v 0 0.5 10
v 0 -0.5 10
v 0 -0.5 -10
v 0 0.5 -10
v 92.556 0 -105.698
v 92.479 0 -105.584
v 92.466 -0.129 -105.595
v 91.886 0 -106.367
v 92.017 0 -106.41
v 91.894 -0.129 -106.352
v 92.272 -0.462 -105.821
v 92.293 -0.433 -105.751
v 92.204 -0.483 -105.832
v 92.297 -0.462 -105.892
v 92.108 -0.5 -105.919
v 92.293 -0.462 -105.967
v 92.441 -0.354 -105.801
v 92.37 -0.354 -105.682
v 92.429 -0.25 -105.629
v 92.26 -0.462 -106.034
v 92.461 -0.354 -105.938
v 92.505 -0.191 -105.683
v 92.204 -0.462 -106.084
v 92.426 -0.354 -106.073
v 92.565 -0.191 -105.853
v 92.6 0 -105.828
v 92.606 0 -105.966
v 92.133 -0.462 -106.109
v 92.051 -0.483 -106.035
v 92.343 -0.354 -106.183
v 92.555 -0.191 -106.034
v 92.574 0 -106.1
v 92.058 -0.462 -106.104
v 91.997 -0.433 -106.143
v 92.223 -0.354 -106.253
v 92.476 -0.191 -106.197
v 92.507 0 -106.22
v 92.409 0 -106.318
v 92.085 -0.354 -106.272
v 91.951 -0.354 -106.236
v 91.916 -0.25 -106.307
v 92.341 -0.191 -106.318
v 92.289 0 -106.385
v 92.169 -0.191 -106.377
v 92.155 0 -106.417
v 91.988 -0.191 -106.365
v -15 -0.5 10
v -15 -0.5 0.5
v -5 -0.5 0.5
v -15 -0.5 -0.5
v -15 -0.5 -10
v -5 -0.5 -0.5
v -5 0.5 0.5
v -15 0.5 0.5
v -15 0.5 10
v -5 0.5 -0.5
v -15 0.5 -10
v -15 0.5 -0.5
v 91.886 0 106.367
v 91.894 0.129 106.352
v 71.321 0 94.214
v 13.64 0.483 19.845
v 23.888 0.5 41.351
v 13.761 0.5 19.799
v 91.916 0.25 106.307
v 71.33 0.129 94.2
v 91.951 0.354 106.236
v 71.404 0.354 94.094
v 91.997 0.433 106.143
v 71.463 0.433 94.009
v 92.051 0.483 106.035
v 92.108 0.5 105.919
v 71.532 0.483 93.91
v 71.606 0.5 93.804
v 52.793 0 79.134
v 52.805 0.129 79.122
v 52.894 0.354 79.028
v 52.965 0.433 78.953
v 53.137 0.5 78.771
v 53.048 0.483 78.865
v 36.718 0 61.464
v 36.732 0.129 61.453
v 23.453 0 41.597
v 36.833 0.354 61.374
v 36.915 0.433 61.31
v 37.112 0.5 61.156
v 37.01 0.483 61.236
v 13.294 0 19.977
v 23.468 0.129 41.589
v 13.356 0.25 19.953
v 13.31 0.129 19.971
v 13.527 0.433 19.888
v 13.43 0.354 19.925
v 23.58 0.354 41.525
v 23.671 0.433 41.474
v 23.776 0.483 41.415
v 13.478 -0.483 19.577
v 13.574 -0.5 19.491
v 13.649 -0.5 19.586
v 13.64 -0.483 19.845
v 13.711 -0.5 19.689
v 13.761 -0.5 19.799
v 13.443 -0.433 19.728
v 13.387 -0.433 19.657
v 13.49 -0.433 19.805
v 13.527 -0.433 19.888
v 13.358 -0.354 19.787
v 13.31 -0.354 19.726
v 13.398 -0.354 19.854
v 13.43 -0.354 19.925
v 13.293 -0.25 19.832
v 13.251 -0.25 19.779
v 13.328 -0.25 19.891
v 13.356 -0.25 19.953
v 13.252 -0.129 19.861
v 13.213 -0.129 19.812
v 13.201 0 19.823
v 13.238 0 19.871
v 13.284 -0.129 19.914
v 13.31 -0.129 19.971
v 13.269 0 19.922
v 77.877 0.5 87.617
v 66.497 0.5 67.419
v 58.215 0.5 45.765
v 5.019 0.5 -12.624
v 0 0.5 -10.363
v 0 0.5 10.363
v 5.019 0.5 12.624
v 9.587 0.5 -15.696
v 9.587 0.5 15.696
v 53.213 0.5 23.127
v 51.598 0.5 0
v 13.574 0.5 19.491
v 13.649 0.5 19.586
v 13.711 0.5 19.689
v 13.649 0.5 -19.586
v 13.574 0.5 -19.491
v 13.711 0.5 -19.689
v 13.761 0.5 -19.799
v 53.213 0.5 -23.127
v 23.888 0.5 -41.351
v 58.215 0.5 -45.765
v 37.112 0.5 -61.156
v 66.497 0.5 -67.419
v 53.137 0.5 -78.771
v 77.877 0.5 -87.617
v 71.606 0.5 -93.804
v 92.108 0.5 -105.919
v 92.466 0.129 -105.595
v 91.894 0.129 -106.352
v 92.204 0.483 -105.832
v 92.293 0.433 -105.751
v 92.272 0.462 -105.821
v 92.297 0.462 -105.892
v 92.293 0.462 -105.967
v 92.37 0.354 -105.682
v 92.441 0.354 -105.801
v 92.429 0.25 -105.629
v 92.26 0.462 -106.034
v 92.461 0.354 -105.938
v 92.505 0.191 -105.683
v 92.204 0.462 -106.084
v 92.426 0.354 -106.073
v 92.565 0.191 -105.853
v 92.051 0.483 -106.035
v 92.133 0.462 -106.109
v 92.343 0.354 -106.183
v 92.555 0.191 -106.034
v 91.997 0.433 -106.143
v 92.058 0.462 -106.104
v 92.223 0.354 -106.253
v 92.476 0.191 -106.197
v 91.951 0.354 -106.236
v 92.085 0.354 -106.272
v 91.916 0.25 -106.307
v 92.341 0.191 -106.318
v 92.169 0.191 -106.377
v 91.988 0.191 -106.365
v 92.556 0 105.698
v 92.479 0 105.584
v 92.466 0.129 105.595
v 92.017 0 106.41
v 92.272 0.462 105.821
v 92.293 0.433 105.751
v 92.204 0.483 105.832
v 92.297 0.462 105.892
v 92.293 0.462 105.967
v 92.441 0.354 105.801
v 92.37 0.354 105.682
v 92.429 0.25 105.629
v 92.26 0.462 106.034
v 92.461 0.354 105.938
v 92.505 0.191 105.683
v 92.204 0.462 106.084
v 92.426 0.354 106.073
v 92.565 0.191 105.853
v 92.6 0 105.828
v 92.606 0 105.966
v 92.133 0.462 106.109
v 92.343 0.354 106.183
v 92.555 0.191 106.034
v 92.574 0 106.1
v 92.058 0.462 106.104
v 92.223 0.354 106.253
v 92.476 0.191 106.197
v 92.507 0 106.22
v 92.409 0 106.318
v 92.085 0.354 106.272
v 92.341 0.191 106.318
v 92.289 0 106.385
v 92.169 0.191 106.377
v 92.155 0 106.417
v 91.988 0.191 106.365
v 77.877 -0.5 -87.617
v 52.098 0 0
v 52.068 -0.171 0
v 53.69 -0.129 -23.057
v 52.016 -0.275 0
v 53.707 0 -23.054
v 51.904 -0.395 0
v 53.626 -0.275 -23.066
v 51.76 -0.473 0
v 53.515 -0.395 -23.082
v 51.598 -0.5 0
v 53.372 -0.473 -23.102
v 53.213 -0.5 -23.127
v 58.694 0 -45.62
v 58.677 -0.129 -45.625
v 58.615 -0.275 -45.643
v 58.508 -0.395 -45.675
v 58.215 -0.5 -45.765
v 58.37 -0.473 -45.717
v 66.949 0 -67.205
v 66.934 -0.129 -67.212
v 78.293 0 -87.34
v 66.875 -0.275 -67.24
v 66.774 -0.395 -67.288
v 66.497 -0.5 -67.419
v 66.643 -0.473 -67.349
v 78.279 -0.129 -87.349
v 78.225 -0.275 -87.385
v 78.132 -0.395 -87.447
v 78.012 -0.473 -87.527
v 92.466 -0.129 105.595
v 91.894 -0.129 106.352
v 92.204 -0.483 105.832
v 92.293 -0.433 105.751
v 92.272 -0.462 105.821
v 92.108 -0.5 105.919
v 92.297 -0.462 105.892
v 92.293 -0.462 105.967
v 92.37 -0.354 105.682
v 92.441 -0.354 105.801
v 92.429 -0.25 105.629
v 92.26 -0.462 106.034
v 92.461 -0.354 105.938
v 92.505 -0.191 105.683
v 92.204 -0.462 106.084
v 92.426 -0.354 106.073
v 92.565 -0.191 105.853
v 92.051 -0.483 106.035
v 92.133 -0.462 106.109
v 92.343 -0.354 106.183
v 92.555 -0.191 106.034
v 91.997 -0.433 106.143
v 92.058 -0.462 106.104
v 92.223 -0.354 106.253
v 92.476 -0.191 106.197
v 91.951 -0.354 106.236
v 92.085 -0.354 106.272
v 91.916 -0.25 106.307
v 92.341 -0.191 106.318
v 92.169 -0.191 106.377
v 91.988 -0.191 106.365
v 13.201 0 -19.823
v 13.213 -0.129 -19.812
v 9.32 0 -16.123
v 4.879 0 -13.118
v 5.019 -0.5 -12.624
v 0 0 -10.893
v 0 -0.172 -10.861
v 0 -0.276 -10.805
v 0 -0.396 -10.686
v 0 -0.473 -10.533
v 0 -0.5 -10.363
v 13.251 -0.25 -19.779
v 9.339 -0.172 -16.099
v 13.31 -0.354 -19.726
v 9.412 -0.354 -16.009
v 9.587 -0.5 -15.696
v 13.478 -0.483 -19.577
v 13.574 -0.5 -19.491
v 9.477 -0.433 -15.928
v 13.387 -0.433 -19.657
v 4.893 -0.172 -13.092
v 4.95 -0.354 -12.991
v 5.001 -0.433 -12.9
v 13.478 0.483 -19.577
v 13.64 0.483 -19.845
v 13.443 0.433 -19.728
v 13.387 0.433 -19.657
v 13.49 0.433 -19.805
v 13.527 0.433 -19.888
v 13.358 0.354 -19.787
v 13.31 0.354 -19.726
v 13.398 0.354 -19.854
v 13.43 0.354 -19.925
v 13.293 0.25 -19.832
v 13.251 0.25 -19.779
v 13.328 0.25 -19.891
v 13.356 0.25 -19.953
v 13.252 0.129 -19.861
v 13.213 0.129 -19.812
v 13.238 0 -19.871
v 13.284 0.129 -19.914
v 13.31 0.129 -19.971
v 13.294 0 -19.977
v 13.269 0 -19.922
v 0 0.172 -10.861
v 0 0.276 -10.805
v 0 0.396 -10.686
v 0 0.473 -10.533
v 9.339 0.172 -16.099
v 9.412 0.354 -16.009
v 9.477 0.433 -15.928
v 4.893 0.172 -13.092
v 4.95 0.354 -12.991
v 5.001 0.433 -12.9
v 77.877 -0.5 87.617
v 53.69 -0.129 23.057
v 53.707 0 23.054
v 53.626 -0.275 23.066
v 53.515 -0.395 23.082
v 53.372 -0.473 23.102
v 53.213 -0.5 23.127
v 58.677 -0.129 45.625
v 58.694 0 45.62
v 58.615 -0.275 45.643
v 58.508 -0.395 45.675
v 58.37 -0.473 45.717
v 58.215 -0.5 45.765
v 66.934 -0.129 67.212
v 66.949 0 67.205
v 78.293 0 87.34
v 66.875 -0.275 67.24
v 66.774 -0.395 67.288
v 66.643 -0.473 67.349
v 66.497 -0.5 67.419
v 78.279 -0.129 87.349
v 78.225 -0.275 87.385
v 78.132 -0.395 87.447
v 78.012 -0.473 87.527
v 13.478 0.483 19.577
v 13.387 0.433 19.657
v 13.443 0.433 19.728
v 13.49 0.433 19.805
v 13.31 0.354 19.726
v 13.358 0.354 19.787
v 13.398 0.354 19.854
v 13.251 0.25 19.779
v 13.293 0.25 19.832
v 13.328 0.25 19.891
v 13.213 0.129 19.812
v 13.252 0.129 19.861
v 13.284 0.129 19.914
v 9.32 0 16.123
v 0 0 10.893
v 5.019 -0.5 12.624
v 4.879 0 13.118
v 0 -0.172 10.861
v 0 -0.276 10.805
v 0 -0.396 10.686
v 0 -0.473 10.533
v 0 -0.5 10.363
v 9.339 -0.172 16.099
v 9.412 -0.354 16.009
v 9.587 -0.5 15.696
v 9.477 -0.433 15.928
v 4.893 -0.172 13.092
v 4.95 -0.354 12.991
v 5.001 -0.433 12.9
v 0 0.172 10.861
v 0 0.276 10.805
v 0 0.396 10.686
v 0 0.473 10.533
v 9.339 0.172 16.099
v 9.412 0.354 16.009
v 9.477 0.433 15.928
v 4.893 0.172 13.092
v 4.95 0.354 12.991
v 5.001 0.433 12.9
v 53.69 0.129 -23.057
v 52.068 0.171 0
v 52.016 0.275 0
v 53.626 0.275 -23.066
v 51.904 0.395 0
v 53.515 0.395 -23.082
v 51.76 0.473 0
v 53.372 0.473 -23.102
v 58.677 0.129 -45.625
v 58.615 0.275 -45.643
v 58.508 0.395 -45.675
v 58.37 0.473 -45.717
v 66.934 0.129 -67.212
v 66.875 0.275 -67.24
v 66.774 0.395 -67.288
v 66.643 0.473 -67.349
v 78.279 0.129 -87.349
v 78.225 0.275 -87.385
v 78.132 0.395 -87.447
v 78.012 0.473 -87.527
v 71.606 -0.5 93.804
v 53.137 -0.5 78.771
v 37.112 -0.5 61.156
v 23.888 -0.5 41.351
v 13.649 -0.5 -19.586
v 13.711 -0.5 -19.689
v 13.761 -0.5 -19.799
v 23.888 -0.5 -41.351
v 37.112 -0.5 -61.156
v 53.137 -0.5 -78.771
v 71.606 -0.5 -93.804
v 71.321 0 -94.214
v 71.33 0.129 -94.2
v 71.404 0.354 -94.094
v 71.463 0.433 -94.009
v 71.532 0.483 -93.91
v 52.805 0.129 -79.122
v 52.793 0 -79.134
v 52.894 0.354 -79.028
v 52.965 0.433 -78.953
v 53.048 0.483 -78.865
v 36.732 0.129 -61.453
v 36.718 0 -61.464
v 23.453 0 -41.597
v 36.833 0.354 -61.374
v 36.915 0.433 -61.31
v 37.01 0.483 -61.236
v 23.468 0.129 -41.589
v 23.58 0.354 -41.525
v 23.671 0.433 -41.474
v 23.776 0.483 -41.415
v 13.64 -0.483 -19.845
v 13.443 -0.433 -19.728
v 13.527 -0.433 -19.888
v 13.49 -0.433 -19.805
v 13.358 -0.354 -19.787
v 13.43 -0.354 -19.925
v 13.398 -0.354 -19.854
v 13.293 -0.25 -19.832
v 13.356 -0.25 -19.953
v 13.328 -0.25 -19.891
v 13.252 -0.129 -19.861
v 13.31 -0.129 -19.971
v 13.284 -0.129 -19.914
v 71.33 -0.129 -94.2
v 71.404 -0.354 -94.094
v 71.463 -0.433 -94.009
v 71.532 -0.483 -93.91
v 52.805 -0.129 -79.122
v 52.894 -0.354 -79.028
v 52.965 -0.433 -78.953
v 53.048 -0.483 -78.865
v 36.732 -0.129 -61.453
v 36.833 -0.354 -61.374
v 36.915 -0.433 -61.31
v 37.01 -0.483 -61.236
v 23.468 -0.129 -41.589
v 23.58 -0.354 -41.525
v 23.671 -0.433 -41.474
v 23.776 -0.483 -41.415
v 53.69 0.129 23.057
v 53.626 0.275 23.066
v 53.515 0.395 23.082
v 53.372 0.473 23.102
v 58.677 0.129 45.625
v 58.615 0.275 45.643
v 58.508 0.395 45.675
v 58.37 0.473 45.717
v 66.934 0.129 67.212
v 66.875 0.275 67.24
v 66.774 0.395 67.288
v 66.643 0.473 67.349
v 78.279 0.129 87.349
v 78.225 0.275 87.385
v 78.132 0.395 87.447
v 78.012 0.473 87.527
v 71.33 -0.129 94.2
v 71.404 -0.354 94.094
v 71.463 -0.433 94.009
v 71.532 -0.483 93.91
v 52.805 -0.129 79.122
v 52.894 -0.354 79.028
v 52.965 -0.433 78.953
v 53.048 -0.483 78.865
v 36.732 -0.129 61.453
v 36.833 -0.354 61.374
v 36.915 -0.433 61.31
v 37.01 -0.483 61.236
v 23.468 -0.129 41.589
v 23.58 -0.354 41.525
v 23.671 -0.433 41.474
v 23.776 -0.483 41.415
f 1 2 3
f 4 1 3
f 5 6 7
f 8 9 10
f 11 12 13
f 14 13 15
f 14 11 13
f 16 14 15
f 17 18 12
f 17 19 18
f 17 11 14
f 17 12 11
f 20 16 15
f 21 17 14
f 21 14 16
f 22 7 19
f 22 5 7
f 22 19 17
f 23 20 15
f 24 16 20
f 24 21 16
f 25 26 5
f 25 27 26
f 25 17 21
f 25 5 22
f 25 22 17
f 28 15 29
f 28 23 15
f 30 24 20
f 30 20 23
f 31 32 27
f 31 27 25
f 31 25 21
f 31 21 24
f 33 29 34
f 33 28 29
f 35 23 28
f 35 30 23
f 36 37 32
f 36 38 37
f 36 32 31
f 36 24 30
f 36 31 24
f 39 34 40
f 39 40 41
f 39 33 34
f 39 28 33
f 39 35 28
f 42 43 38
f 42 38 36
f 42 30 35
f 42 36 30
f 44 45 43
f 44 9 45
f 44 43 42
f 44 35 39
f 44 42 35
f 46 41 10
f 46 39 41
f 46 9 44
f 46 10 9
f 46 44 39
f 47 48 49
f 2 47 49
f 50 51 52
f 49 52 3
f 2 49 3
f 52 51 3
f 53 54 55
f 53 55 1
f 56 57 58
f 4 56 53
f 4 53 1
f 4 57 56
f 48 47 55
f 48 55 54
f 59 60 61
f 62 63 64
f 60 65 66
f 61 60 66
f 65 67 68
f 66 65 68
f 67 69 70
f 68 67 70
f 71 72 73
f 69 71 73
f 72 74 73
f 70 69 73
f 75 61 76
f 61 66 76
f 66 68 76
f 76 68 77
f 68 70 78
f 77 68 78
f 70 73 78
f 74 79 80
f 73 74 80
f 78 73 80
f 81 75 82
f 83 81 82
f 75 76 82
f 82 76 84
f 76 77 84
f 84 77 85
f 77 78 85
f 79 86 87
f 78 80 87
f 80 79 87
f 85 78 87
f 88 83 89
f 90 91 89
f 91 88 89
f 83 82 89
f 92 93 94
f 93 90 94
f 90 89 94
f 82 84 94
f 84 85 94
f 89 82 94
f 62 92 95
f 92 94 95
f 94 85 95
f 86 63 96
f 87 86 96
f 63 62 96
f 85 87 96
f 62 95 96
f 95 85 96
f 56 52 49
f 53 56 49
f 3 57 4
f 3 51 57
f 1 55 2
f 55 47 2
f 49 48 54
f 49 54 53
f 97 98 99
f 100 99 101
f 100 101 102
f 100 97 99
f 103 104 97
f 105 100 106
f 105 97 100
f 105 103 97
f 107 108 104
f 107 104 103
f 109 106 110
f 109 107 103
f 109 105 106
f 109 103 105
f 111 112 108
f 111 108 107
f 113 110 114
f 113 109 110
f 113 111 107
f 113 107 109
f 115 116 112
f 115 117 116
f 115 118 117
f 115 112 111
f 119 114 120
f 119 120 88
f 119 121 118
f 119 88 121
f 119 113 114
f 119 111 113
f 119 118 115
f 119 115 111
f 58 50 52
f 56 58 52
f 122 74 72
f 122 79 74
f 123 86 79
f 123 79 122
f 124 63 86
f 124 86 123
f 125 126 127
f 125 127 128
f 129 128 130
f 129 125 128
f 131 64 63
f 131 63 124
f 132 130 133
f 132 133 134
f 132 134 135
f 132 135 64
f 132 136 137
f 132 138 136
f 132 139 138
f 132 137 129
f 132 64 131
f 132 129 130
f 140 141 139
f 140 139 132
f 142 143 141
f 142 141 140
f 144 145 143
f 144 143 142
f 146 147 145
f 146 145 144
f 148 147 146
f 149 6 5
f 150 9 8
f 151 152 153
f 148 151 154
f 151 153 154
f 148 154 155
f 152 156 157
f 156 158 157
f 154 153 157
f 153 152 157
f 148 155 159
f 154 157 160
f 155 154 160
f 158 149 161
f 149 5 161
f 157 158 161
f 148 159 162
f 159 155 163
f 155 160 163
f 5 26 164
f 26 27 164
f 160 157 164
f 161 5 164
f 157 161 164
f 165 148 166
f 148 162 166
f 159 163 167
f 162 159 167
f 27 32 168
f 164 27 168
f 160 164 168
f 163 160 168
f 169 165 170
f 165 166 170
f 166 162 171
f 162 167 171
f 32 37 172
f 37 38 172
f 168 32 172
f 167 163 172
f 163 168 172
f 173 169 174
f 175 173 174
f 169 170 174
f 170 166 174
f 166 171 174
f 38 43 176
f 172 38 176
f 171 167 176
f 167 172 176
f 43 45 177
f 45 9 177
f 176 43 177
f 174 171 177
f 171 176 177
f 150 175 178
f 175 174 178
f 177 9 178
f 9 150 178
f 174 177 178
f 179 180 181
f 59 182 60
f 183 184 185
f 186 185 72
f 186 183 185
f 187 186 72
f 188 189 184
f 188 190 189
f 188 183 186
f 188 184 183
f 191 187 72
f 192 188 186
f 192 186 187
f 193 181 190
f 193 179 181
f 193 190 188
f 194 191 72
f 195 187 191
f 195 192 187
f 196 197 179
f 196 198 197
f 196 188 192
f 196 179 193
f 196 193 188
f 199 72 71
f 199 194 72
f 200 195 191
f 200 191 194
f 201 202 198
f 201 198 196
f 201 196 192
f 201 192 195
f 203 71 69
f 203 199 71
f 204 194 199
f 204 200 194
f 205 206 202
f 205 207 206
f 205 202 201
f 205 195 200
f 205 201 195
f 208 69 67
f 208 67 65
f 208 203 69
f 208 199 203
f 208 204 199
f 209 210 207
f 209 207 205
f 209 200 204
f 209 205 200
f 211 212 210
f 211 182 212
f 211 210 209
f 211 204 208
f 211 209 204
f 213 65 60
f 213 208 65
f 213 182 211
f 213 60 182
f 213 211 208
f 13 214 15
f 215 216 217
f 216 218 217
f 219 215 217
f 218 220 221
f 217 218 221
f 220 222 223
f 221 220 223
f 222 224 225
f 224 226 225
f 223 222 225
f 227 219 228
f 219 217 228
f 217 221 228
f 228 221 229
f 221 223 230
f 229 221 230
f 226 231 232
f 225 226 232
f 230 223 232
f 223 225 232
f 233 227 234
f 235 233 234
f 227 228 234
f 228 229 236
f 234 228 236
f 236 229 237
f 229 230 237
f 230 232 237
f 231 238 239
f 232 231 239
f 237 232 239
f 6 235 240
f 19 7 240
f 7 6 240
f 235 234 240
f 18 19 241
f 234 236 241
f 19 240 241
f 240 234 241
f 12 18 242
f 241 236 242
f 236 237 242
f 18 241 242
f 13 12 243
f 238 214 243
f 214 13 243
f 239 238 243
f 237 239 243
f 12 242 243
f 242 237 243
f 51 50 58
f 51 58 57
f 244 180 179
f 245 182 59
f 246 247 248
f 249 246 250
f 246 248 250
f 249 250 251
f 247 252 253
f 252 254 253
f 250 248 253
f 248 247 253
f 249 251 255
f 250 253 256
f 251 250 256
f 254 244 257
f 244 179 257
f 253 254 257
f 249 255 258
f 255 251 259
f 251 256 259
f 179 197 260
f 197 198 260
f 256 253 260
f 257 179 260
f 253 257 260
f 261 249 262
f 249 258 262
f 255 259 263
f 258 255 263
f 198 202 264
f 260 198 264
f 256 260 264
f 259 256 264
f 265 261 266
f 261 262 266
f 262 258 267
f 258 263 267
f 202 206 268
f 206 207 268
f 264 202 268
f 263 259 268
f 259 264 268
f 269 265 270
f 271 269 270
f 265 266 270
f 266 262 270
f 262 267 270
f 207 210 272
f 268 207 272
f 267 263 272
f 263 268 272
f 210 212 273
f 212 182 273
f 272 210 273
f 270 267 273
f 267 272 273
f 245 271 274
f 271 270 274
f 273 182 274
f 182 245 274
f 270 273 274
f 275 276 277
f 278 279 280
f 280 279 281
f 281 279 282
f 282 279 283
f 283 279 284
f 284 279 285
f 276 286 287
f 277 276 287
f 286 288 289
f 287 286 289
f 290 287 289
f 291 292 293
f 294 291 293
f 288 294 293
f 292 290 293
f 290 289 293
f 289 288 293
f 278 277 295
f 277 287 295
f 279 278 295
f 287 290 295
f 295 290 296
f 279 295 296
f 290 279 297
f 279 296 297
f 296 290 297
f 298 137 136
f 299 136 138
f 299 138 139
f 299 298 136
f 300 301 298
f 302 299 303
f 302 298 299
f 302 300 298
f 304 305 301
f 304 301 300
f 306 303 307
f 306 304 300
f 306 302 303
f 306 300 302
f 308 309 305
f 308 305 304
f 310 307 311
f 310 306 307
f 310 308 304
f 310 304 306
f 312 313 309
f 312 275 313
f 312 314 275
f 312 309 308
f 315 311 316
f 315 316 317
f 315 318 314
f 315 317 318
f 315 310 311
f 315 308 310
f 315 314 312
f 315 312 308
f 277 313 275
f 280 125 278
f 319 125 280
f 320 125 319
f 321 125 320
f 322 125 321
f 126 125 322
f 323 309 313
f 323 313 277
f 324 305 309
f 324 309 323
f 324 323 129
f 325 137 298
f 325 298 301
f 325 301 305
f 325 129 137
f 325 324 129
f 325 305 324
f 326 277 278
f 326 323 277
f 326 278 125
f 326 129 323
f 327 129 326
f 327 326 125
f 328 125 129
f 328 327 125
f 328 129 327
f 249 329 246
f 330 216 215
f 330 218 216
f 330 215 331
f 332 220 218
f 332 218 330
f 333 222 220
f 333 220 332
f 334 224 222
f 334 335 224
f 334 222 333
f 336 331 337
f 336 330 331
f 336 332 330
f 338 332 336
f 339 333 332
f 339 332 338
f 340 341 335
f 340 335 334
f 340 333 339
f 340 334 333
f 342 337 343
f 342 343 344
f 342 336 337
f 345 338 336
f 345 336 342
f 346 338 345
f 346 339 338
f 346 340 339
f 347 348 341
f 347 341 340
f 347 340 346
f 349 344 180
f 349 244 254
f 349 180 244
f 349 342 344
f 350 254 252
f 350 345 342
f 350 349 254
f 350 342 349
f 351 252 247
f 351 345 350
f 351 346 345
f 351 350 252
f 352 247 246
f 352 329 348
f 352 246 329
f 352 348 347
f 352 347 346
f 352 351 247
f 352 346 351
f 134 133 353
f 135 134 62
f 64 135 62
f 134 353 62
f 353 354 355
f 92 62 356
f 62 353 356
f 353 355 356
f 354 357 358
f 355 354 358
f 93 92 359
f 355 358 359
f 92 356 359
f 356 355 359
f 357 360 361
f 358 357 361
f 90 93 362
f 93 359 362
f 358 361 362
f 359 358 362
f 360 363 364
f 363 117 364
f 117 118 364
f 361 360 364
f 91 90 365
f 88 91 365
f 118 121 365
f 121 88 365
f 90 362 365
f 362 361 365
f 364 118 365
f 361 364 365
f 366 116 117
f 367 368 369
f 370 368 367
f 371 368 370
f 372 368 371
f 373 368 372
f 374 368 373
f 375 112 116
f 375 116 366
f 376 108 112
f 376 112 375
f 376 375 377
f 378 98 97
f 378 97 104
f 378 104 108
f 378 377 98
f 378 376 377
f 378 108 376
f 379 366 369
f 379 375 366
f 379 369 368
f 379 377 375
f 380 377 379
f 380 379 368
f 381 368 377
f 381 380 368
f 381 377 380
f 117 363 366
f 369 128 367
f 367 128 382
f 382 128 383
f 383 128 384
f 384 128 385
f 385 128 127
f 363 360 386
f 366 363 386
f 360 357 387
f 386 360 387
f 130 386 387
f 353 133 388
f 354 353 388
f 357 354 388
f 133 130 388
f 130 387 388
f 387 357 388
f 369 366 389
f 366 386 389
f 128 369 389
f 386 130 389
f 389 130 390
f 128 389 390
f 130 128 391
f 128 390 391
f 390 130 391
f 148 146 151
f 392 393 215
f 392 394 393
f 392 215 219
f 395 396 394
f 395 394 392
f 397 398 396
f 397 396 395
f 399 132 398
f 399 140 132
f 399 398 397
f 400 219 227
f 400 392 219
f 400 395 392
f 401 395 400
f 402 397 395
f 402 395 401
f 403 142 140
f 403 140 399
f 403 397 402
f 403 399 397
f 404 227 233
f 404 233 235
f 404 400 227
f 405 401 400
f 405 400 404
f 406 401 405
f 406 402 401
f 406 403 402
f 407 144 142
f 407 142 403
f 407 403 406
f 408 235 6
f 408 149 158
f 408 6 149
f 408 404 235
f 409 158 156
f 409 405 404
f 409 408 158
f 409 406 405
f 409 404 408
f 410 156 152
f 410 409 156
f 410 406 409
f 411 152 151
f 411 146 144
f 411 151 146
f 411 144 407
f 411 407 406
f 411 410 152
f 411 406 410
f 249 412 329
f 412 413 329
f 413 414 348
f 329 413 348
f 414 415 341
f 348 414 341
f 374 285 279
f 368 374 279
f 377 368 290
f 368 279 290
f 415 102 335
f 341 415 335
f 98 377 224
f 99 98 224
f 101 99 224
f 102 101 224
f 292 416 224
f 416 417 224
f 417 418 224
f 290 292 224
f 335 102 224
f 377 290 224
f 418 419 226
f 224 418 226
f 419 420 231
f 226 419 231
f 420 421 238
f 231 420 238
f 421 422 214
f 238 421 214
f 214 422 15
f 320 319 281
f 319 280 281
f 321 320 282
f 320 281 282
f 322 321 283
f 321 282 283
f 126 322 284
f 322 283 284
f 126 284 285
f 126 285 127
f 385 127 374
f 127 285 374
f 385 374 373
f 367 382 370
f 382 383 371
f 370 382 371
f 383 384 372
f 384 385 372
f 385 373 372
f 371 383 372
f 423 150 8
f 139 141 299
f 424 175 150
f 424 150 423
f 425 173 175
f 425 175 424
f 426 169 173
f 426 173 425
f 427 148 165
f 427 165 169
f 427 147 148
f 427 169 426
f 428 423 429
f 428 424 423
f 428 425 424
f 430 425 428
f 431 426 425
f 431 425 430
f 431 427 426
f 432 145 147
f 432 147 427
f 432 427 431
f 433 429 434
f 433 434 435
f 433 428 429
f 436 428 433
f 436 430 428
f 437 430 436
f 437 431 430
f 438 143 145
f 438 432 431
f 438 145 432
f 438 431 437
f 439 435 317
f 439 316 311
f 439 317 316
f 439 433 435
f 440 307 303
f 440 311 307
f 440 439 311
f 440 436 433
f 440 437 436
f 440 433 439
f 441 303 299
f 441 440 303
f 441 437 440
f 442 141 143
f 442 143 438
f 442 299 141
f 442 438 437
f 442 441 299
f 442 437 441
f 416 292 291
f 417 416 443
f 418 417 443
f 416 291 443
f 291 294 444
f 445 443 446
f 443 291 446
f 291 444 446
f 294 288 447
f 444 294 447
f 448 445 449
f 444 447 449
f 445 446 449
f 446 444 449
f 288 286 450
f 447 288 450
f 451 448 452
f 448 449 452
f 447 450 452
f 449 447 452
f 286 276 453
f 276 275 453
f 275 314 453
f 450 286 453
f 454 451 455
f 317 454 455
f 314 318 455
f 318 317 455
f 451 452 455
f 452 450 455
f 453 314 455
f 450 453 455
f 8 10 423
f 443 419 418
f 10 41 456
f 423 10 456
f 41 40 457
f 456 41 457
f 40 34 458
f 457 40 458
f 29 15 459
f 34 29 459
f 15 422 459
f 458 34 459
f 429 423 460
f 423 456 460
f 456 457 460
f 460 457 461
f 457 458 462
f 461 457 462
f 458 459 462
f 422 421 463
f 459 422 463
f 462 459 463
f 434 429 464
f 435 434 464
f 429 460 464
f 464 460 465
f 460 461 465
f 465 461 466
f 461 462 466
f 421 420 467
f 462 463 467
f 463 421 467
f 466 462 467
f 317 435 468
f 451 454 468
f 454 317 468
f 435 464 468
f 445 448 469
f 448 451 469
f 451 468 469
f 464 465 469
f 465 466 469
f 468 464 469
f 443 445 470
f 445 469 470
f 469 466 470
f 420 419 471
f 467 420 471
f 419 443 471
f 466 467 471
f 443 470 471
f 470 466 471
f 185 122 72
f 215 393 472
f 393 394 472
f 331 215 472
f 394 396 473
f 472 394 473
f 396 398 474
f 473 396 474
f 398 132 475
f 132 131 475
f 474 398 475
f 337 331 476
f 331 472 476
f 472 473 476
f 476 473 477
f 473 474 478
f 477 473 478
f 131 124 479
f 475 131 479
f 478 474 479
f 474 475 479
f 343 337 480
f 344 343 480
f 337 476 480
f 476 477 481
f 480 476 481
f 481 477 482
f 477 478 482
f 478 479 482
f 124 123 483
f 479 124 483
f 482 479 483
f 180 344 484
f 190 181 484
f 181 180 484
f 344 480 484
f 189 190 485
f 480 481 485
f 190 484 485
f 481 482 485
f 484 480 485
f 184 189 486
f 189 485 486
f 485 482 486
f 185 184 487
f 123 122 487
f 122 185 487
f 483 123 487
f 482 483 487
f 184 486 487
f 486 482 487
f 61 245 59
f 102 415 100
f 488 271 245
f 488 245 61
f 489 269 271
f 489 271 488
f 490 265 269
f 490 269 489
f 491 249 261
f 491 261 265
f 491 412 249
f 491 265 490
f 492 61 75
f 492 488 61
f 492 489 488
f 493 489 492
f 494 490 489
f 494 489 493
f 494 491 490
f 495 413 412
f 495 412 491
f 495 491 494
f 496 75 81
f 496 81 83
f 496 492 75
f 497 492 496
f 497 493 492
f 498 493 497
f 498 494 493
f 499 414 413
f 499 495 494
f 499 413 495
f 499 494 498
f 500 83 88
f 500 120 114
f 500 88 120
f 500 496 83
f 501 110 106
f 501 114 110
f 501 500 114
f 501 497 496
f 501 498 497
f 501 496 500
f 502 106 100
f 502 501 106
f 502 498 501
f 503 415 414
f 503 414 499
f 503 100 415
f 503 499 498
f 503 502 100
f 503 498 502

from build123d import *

# Parameters (mm, degrees)
F1_DEPTH = 0.5
F2_R     = 0.4999
F0_W     = 15
F0_H     = 10
F4_DEPTH = 0.5
F6_W     = 10
F6_H     = 1
F7_DEPTH = 1.0010001


# Not quite as in the source:
# - a fillet or chamfer is up to 0.001 mm smaller than in the source, because OpenCascade refuses the exact size


with BuildPart() as f1:
    # F0 (on Front) → F1 (new body, symmetric)
    with BuildSketch(Plane.XZ):
        with BuildLine():
            ThreePointArc((13.2612720792, 19.8919038619), (7.1998646271, 14.5536810673), (0, 10.8931848908))
            Line((0, 10.8931848908), (0, 10))
            Line((0, 10), (0, 0))
            Line((0, 0), (52.0978415222, 0))
            ThreePointArc((52.0978415222, 0), (62.8950817615, 57.7854744772), (94.2497236639, 107.511))
            ThreePointArc((94.2497236639, 107.511), (45.2820813919, 71.5336359019), (13.2612720792, 19.8919038619))
        make_face()
    extrude(amount=F1_DEPTH, both=True)

    # F2 (radius 0.5 in the source; OpenCascade refuses exactly that, so slightly less here)
    f2_edges = [f1.edges().sort_by_distance(p)[0] for p in [
        (7.199865, -0.5, 14.553681),
        (7.199865, 0.5, 14.553681),
        (45.282081, -0.5, 71.533636),
        (45.282081, 0.5, 71.533636),
        (13.261272, 0, 19.891904),
        (94.249724, 0, 107.511),
        (62.895082, 0.5, 57.785474),
        (62.895082, -0.5, 57.785474),
    ]]
    fillet(f2_edges, radius=F2_R)

    # F3: F1 across plane


with BuildPart() as f1_1:
    add(f1.part)
    add(f1.part.mirror(Plane.XY))


with BuildPart() as f4:
    # F0 (on Front) → F4 (new body, symmetric)
    with BuildSketch(Plane.XZ):
        with Locations((-7.5, 5)):
            Rectangle(F0_W, F0_H)
    extrude(amount=F4_DEPTH, both=True)

    # F5: F4 across plane


with BuildPart() as f4_1:
    add(f4.part)
    add(f4.part.mirror(Plane.XY))

    # F6 (on face) → F7 (cut, through all)
    with BuildSketch(Plane.XZ.offset(0.5)):
        with Locations((-10, 0)):
            Rectangle(F6_W, F6_H)
    extrude(amount=-F7_DEPTH, mode=Mode.SUBTRACT)


solid = Compound([f1_1.part, f4_1.part])
